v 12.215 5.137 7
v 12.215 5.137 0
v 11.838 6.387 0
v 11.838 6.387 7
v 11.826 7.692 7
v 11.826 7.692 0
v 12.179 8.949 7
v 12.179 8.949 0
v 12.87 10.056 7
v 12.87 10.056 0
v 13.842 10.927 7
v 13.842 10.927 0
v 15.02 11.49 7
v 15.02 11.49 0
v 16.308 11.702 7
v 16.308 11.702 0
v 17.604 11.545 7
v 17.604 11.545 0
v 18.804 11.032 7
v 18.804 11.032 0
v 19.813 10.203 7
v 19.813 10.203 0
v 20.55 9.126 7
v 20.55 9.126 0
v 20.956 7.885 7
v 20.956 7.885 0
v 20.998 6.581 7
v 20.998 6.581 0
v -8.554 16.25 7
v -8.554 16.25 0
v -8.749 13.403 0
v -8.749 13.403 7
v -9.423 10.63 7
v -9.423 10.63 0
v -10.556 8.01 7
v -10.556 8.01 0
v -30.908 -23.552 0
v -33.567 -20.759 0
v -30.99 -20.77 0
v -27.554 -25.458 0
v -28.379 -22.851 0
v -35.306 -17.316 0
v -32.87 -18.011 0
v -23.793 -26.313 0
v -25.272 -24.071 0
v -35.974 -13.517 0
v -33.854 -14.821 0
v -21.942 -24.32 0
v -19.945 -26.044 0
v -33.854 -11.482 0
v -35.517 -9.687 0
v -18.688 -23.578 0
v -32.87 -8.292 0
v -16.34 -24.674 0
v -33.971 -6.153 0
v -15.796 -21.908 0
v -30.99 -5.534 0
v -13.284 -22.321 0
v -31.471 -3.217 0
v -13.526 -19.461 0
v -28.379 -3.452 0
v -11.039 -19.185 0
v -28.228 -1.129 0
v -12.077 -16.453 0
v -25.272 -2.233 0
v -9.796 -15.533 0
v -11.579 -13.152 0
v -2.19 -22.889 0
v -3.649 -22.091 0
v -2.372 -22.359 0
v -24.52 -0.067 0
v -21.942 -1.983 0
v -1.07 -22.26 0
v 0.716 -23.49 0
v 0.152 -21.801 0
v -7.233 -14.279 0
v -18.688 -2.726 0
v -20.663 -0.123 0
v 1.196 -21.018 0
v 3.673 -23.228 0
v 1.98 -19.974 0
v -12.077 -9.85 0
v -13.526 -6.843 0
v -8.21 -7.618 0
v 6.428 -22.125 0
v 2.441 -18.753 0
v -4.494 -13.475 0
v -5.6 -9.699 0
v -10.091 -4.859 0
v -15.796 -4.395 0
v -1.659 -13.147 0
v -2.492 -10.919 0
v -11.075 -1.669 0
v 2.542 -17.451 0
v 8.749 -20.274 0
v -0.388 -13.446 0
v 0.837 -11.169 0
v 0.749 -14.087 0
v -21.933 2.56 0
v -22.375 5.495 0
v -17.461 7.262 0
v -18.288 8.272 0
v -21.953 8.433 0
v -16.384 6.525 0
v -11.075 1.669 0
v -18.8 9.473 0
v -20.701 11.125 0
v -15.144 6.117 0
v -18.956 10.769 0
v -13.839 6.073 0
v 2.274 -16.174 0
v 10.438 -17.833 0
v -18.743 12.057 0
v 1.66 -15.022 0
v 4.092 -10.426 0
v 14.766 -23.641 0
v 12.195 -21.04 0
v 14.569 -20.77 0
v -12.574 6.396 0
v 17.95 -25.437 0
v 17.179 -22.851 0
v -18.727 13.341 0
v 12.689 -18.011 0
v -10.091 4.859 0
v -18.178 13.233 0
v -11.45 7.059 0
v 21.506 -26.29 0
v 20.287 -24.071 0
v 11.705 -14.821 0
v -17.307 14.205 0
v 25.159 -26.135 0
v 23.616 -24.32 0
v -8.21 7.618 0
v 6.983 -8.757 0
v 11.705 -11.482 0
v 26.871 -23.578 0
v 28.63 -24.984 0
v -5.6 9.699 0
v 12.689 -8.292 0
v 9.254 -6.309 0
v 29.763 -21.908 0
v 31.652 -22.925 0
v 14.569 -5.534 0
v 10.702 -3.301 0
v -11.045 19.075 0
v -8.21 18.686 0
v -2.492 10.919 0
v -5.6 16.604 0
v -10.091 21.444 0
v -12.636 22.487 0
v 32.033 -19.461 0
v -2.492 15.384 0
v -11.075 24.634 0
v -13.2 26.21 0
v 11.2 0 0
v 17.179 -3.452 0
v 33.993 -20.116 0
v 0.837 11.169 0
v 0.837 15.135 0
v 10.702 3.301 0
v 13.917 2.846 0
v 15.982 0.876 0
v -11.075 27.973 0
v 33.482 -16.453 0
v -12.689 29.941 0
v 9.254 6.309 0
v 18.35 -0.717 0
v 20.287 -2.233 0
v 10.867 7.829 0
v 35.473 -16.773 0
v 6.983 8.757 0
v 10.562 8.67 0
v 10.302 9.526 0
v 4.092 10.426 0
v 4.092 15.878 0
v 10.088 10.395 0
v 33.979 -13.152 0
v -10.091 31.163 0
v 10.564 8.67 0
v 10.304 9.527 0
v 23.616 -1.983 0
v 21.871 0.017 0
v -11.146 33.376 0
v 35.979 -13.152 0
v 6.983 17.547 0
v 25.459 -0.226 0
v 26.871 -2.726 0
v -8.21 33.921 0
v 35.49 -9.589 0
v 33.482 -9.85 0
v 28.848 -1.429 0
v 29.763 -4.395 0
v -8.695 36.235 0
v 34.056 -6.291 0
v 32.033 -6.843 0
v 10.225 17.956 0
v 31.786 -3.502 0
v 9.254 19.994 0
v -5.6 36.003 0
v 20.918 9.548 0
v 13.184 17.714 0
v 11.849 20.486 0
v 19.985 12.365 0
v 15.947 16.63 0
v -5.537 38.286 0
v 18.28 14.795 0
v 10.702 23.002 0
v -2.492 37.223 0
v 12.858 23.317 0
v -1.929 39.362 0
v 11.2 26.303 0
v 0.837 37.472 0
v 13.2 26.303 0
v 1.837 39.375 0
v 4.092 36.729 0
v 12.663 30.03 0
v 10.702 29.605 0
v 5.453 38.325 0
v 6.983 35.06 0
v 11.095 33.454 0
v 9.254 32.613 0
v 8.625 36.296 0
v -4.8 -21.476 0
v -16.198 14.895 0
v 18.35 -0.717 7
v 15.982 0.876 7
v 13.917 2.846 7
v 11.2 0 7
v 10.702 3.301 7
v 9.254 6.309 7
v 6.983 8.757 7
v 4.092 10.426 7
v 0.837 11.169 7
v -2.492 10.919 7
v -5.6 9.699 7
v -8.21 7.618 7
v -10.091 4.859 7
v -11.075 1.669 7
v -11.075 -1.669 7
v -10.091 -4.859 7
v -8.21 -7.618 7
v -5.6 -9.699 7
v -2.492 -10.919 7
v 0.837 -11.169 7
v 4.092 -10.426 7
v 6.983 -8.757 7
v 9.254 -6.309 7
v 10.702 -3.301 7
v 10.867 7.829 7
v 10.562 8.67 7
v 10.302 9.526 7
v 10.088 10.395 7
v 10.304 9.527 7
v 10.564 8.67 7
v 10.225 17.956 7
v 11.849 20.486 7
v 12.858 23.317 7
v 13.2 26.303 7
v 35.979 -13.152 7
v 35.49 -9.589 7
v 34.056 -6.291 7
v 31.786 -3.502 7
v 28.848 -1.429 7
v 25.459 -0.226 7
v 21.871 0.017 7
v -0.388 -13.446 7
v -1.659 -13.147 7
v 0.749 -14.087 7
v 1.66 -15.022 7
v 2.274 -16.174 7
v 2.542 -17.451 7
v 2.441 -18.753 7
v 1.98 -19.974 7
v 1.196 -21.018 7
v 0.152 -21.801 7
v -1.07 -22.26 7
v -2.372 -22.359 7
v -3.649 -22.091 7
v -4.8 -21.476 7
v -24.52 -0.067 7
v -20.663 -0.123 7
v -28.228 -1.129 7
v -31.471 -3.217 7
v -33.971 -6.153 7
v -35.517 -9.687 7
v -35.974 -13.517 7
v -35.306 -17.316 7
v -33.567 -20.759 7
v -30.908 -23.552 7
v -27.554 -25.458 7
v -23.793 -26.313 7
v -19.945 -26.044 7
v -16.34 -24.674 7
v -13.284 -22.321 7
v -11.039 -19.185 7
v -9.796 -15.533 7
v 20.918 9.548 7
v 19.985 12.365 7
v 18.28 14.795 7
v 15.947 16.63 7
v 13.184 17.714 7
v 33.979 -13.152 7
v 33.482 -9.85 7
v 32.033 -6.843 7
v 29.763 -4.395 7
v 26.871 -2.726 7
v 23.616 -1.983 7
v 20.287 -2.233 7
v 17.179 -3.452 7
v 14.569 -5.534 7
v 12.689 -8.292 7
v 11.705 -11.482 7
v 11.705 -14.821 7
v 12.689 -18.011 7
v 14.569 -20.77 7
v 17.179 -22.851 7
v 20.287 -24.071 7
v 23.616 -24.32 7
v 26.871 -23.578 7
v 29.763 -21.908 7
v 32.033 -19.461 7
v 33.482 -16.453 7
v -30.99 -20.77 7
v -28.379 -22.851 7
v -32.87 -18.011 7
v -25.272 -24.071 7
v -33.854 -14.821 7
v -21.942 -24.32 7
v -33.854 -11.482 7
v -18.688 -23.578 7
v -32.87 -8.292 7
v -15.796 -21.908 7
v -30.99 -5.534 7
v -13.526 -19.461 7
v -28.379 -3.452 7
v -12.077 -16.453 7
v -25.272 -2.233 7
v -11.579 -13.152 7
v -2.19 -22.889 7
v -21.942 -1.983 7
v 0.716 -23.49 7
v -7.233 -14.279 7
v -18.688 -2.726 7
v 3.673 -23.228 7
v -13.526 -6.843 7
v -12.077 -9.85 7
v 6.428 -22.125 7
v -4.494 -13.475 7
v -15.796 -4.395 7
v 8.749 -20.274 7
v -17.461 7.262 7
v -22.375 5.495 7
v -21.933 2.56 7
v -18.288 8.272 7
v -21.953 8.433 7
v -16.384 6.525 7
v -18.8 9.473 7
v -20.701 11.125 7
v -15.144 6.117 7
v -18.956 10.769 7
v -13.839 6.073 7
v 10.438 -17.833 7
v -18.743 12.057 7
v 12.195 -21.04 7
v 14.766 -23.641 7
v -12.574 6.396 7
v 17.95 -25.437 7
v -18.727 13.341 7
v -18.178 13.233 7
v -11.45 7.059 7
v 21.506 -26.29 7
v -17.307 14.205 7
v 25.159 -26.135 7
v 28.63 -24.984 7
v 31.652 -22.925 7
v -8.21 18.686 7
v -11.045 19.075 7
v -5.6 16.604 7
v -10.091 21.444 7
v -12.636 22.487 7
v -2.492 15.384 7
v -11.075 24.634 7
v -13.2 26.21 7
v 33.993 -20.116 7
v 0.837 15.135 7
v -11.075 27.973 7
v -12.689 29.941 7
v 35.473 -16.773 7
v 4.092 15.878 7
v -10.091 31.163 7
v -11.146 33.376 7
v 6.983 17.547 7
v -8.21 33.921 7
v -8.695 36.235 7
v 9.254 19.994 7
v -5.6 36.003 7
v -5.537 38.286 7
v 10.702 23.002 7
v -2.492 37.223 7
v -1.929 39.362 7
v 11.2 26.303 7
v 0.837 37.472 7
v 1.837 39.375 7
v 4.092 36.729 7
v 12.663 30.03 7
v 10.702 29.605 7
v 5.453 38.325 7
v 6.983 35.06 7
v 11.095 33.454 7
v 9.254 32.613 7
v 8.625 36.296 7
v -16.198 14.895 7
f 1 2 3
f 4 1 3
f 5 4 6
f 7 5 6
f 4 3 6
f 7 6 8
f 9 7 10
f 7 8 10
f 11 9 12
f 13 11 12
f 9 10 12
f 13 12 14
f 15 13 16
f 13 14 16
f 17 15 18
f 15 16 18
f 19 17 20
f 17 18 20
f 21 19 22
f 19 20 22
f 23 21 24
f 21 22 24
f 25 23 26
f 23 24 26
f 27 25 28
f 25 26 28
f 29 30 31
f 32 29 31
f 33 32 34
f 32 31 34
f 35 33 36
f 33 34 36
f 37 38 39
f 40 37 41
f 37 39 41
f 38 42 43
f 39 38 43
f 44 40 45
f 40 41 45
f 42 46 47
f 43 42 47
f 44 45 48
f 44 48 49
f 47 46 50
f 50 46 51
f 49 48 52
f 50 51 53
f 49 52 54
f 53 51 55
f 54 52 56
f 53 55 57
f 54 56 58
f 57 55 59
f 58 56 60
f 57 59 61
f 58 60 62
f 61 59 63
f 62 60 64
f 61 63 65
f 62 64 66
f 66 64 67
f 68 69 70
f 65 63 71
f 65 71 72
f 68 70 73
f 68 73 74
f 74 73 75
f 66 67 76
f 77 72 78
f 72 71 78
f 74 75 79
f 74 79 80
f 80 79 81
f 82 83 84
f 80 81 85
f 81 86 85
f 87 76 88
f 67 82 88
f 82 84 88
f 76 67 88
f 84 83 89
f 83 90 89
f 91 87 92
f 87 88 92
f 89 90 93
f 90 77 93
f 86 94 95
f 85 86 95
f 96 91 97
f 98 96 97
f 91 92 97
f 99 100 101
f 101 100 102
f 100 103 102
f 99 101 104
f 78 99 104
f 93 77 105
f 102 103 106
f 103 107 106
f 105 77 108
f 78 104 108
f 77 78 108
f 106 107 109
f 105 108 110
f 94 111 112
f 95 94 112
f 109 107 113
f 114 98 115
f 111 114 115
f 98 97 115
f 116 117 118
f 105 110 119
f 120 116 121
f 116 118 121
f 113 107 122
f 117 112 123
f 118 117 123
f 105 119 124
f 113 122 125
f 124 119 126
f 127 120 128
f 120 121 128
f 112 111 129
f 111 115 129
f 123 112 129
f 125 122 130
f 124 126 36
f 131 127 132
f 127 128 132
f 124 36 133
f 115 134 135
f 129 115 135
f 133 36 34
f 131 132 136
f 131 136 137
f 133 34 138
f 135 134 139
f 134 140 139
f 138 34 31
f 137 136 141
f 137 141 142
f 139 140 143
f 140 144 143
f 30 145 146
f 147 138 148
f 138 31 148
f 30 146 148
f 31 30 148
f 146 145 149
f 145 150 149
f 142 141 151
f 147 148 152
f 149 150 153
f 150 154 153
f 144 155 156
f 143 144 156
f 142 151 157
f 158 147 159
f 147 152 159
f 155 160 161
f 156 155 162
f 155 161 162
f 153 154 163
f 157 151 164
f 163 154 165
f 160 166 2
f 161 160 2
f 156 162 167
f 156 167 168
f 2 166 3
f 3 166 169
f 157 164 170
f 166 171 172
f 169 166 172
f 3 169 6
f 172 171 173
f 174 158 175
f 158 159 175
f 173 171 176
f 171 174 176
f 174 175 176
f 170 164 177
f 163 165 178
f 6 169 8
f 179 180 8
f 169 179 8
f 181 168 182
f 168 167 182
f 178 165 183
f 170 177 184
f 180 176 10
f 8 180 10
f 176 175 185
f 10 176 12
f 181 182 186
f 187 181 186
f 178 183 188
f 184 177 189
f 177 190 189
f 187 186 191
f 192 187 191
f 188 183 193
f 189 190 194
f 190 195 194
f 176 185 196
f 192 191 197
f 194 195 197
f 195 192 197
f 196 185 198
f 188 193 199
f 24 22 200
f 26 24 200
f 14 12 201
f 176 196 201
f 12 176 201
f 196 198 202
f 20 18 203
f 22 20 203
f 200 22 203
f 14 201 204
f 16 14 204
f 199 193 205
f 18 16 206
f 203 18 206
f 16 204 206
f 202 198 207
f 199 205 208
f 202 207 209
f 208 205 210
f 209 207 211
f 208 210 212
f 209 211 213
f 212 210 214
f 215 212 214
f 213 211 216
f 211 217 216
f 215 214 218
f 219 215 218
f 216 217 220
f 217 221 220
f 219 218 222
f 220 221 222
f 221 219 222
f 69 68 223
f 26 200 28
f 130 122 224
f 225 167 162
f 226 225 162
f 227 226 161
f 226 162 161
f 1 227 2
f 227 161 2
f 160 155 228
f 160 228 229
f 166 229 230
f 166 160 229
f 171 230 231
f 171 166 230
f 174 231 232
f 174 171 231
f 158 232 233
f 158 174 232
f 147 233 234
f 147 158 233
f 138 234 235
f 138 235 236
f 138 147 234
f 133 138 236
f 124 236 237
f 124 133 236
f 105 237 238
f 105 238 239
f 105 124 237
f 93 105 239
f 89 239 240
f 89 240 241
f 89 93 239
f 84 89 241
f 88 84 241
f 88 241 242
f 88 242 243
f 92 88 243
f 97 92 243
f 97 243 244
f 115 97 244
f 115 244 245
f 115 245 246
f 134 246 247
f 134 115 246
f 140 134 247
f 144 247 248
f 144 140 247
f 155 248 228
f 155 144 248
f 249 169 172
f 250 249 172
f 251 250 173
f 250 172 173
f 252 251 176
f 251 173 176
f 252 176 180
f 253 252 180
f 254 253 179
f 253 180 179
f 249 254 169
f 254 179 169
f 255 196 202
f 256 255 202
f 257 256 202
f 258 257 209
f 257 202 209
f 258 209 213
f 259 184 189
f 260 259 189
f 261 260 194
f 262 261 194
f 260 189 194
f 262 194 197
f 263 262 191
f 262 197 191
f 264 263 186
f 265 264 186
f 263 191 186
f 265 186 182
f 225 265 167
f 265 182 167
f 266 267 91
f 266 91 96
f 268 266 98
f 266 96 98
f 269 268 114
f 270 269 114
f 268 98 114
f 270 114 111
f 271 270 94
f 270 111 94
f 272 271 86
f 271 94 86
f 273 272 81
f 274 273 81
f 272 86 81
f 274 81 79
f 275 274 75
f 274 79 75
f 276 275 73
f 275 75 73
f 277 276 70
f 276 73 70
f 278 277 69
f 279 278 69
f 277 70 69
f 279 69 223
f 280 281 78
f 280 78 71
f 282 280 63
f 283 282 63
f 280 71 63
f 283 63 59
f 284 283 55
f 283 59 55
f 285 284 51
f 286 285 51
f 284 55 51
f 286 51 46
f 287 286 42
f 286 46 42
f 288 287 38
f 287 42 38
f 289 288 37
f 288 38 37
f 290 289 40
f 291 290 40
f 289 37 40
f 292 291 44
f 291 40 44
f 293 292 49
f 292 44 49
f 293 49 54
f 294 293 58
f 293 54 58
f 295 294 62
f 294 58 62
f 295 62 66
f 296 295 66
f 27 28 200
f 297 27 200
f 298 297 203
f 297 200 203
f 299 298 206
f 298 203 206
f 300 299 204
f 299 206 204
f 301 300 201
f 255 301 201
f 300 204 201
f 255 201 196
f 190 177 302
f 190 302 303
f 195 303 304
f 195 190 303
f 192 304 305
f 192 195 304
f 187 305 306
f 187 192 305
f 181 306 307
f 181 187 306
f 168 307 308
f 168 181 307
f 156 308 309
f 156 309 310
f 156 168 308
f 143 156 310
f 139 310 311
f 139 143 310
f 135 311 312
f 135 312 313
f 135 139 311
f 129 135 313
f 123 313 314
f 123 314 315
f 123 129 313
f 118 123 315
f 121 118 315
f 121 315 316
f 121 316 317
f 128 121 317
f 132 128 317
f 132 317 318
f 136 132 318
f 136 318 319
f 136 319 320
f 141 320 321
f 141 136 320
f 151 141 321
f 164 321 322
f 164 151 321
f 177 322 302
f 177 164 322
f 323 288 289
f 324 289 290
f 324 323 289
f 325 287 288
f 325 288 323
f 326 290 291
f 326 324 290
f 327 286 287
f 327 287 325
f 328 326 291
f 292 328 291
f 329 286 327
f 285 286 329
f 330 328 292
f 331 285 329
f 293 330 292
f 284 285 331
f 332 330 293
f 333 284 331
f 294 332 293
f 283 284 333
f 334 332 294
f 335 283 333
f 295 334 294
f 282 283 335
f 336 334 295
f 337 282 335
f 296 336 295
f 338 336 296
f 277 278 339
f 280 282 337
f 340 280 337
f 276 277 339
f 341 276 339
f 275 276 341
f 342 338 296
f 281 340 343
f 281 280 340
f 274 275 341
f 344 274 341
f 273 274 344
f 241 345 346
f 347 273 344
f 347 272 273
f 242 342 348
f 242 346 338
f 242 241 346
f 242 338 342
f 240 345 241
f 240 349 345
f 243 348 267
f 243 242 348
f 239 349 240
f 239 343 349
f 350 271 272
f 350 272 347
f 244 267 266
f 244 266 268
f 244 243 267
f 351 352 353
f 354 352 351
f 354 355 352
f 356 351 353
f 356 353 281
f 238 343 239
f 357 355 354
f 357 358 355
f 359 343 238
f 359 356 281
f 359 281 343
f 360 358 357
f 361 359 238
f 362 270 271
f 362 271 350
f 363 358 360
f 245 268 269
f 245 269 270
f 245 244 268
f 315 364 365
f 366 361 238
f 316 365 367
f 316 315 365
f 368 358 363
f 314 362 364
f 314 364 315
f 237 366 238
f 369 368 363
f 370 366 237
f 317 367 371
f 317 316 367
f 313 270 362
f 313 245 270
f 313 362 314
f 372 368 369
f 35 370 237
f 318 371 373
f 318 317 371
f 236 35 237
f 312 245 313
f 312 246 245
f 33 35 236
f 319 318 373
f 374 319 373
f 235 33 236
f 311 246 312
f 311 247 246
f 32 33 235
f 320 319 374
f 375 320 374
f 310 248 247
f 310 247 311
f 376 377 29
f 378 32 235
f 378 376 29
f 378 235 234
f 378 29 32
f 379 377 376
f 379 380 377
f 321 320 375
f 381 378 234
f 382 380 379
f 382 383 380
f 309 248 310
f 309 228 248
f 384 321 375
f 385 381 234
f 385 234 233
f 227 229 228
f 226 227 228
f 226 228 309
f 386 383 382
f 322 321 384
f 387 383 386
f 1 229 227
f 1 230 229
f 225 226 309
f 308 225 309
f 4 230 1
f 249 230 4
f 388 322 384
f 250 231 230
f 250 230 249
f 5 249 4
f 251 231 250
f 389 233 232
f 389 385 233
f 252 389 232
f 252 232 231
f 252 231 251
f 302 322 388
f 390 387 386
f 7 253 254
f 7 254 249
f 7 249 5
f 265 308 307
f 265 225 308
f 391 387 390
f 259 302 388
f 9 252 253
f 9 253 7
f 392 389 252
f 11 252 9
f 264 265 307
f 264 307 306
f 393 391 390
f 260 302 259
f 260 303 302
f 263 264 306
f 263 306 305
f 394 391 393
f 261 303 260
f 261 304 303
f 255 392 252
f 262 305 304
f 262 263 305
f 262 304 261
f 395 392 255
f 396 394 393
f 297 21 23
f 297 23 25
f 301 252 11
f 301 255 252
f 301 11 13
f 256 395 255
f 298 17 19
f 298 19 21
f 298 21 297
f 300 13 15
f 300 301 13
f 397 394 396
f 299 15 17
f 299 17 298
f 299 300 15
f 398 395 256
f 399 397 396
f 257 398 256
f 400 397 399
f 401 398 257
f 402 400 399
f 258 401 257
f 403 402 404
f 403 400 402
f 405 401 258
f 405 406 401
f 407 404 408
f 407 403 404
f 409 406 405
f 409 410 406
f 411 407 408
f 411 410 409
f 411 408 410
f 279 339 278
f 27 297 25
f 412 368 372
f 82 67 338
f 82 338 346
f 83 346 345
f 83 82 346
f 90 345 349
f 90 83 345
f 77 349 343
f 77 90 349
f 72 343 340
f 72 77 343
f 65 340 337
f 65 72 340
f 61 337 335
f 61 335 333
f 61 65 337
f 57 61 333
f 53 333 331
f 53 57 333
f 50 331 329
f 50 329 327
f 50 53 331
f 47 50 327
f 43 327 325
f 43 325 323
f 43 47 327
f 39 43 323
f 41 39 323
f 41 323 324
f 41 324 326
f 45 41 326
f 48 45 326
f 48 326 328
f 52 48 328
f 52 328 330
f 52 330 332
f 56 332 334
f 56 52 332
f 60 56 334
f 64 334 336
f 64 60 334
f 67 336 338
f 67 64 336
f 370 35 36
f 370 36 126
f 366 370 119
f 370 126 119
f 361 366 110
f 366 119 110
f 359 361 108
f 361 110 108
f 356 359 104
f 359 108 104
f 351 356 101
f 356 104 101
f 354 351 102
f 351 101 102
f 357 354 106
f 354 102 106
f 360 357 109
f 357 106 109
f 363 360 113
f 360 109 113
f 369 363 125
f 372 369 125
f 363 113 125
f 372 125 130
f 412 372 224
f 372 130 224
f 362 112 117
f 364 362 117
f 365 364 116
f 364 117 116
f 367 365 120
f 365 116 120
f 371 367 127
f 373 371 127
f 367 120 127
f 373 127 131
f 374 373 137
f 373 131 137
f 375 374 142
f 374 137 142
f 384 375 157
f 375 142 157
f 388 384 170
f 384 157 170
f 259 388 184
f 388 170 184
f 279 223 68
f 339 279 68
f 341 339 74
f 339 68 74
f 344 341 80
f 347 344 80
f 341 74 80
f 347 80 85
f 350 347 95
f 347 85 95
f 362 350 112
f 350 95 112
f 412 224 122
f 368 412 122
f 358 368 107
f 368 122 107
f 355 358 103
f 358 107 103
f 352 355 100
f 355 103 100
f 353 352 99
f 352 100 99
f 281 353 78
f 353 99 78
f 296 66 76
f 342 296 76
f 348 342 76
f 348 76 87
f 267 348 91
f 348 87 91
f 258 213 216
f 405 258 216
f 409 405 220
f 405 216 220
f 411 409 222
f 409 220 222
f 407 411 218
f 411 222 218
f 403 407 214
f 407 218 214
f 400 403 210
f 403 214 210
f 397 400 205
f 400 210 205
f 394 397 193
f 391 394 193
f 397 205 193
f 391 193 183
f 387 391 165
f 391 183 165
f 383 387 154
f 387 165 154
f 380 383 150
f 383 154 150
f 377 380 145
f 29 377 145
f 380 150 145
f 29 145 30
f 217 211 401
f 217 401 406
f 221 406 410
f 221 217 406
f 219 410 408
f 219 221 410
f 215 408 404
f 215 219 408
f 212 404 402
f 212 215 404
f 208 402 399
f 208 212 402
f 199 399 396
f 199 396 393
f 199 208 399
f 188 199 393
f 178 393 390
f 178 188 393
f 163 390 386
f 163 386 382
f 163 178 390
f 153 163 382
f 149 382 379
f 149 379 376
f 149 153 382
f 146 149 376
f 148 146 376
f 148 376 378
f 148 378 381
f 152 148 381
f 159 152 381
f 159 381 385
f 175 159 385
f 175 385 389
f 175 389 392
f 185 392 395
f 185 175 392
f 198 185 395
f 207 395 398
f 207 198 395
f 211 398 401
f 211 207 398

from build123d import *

# Parameters (mm, degrees)
F0_R     = 11.2
F1_DEPTH = 7
F3_DEPTH = 7


with BuildPart() as f1:
    # F0 (on Top) → F1 (new body)
    with BuildSketch(Plane.XY):
        with BuildLine():
            ThreePointArc((10.1597440205, 17.8761330961), (12.4166948314, 21.8239716806), (13.2, 26.3034459203))
            ThreePointArc((13.2, 26.3034459203), (-5.5373555744, 38.2858368855), (-8.5541959459, 16.2503005558))
            ThreePointArc((-8.5541959459, 16.2503005558), (-5.0829218379, 14.1213317529), (-1.12791098, 13.1517229602))
            ThreePointArc((-1.12791098, 13.1517229602), (0, 13.2), (1.12791098, 13.1517229602))
            ThreePointArc((1.12791098, 13.1517229602), (6.1182351733, 14.606984987), (10.1597440205, 17.8761330961))
        make_face()
        with Locations((0, 26.3034459203)):
            Circle(F0_R, mode=Mode.SUBTRACT)
        with BuildLine():
            ThreePointArc((-1.12791098, 13.1517229602), (-5.0829218379, 14.1213317529), (-8.5541959459, 16.2503005558))
            ThreePointArc((-8.5541959459, 16.2503005558), (-9.0756063849, 11.8077563343), (-10.7501080818, 7.6599723387))
            ThreePointArc((-10.7501080818, 7.6599723387), (-6.5430623893, 11.4642197541), (-1.12791098, 13.1517229602))
        make_face()
        with BuildLine():
            ThreePointArc((11.3058248826, 6.8130994213), (9.7913703879, 12.2470899677), (10.1597440205, 17.8761330961))
            ThreePointArc((10.1597440205, 17.8761330961), (6.1182351733, 14.606984987), (1.12791098, 13.1517229602))
            ThreePointArc((1.12791098, 13.1517229602), (6.9781074775, 11.204731859), (11.3058248826, 6.8130994213))
        make_face()
        with BuildLine():
            ThreePointArc((1.12791098, 13.1517229602), (0, 13.2), (-1.12791098, 13.1517229602))
            ThreePointArc((-1.12791098, 13.1517229602), (0, 13.1034459203), (1.12791098, 13.1517229602))
        make_face()
        with BuildLine():
            ThreePointArc((1.12791098, 13.1517229602), (0, 13.1034459203), (-1.12791098, 13.1517229602))
            ThreePointArc((-1.12791098, 13.1517229602), (-6.5430623893, 11.4642197541), (-10.7501080818, 7.6599723387))
            ThreePointArc((-10.7501080818, 7.6599723387), (-11.1373686058, 7.0132721384), (-11.5532296186, 6.3845818484))
            ThreePointArc((-11.5532296186, 6.3845818484), (-13.1926361713, 0.4408524163), (-11.9536816771, -5.5990619182))
            ThreePointArc((-11.9536816771, -5.5990619182), (-11.3479170441, -6.5517229602), (-10.825770697, -7.552661042))
            ThreePointArc((-10.825770697, -7.552661042), (-6.6567743469, -11.3985681247), (-1.2586765967, -13.1398528616))
            ThreePointArc((-1.2586765967, -13.1398528616), (-0.5049875326, -13.1518802131), (0.247404736, -13.1976812697))
            ThreePointArc((0.247404736, -13.1976812697), (6.2145286938, -11.6455842754), (10.825770697, -7.552661042))
            ThreePointArc((10.825770697, -7.552661042), (11.3479170441, -6.5517229602), (11.9536816771, -5.5990619182))
            ThreePointArc((11.9536816771, -5.5990619182), (12.8846536263, -2.8680482791), (13.2, 0))
            ThreePointArc((13.2, 0), (12.8987588115, 2.8039295858), (12.0087846785, 5.4798805229))
            ThreePointArc((12.0087846785, 5.4798805229), (11.6423561384, 6.1386080748), (11.3058248826, 6.8130994213))
            ThreePointArc((11.3058248826, 6.8130994213), (6.9781074775, 11.204731859), (1.12791098, 13.1517229602))
        make_face()
        Circle(F0_R, mode=Mode.SUBTRACT)
        with BuildLine():
            ThreePointArc((12.0087846785, 5.4798805229), (11.6763488687, 6.1565312552), (11.3058248826, 6.8130994213))
            ThreePointArc((11.3058248826, 6.8130994213), (11.6423561384, 6.1386080748), (12.0087846785, 5.4798805229))
        make_face()
        with BuildLine():
            ThreePointArc((-11.9536816771, -5.5990619182), (-13.1926361713, 0.4408524163), (-11.5532296186, 6.3845818484))
            ThreePointArc((-11.5532296186, 6.3845818484), (-15.5019762284, 2.35603051), (-20.5610573929, -0.1394701303))
            ThreePointArc((-20.5610573929, -0.1394701303), (-15.7091376581, -2.0049454071), (-11.9536816771, -5.5990619182))
        make_face()
        with BuildLine():
            ThreePointArc((18.3502710734, -0.7169992799), (14.7636201396, 1.955827517), (12.0087846785, 5.4798805229))
            ThreePointArc((12.0087846785, 5.4798805229), (12.8987588115, 2.8039295858), (13.2, 0))
            ThreePointArc((13.2, 0), (12.8846536263, -2.8680482791), (11.9536816771, -5.5990619182))
            ThreePointArc((11.9536816771, -5.5990619182), (14.7708929522, -2.6587264394), (18.3502710734, -0.7169992799))
        make_face()
        with BuildLine():
            ThreePointArc((-10.825770697, -7.552661042), (-11.3479170441, -6.5517229602), (-11.9536816771, -5.5990619182))
            ThreePointArc((-11.9536816771, -5.5990619182), (-11.43153533, -6.6), (-10.825770697, -7.552661042))
        make_face()
        with BuildLine():
            ThreePointArc((-10.825770697, -7.552661042), (-11.43153533, -6.6), (-11.9536816771, -5.5990619182))
            ThreePointArc((-11.9536816771, -5.5990619182), (-15.7091376581, -2.0049454071), (-20.5610573929, -0.1394701303))
            ThreePointArc((-20.5610573929, -0.1394701303), (-33.5968448072, -20.7163789966), (-9.7960751276, -15.533301276))
            ThreePointArc((-9.7960751276, -15.533301276), (-9.633719613, -14.3474278455), (-9.5794523741, -13.1517229602))
            ThreePointArc((-9.5794523741, -13.1517229602), (-9.8947987478, -10.283674681), (-10.825770697, -7.552661042))
        make_face()
        with Locations((-22.7794523741, -13.1517229602)):
            Circle(F0_R, mode=Mode.SUBTRACT)
        with BuildLine():
            ThreePointArc((35.9794523741, -13.1517229602), (30.3878295608, -2.3650368804), (18.3502710734, -0.7169992799))
            ThreePointArc((18.3502710734, -0.7169992799), (14.7708929522, -2.6587264394), (11.9536816771, -5.5990619182))
            ThreePointArc((11.9536816771, -5.5990619182), (11.43153533, -6.6), (10.825770697, -7.552661042))
            ThreePointArc((10.825770697, -7.552661042), (9.5909024848, -12.6020395799), (10.4013133724, -17.7366629658))
            ThreePointArc((10.4013133724, -17.7366629658), (25.1084613025, -26.1446332351), (35.9794523741, -13.1517229602))
        make_face()
        with Locations((22.7794523741, -13.1517229602)):
            Circle(F0_R, mode=Mode.SUBTRACT)
        with BuildLine():
            ThreePointArc((-1.2586765967, -13.1398528616), (-6.6567743469, -11.3985681247), (-10.825770697, -7.552661042))
            ThreePointArc((-10.825770697, -7.552661042), (-9.8947987478, -10.283674681), (-9.5794523741, -13.1517229602))
            ThreePointArc((-9.5794523741, -13.1517229602), (-9.633719613, -14.3474278455), (-9.7960751276, -15.533301276))
            ThreePointArc((-9.7960751276, -15.533301276), (-5.6880137547, -13.7635838512), (-1.2586765967, -13.1398528616))
        make_face()
        with BuildLine():
            ThreePointArc((10.825770697, -7.552661042), (11.43153533, -6.6), (11.9536816771, -5.5990619182))
            ThreePointArc((11.9536816771, -5.5990619182), (11.3479170441, -6.5517229602), (10.825770697, -7.552661042))
        make_face()
        with BuildLine():
            ThreePointArc((10.4013133724, -17.7366629658), (9.5909024848, -12.6020395799), (10.825770697, -7.552661042))
            ThreePointArc((10.825770697, -7.552661042), (6.2145286938, -11.6455842754), (0.247404736, -13.1976812697))
            ThreePointArc((0.247404736, -13.1976812697), (5.7106058405, -14.6031204777), (10.4013133724, -17.7366629658))
        make_face()
    extrude(amount=F1_DEPTH)

    # F2 (on Top) → F3 (join)
    with BuildSketch(Plane.XY):
        with BuildLine():
            ThreePointArc((12.2943036258, 4.9750674516), (15.5675466721, 11.6262977505), (20.9984593093, 6.580688525))
            ThreePointArc((20.9984593093, 6.580688525), (18.2353036168, 14.8413488661), (10.0971376523, 17.9467946291))
            ThreePointArc((10.0971376523, 17.9467946291), (9.9225536839, 11.2452805665), (12.2943036258, 4.9750674516))
        make_face()
        with BuildLine():
            ThreePointArc((-1.8386170143, -13.1347129876), (2.2848958678, -19.2950397679), (-4.8001862176, -21.4755434647))
            ThreePointArc((-4.8001862176, -21.4755434647), (3.735333336, -23.2129106109), (10.4938112391, -17.717775027))
            ThreePointArc((10.4938112391, -17.717775027), (4.7859075855, -14.1929896942), (-1.8386170143, -13.1347129876))
        make_face()
        with BuildLine():
            ThreePointArc((-10.4556866115, 8.159645536), (-17.85244254, 7.6687420174), (-16.1982730917, 14.8948549397))
            ThreePointArc((-16.1982730917, 14.8948549397), (-21.9706369528, 8.3715617448), (-20.5909488915, -0.2290196021))
            ThreePointArc((-20.5909488915, -0.2290196021), (-14.6756844073, 2.9411945739), (-10.4556866115, 8.159645536))
        make_face()
    extrude(amount=F3_DEPTH)


solid = f1.part
